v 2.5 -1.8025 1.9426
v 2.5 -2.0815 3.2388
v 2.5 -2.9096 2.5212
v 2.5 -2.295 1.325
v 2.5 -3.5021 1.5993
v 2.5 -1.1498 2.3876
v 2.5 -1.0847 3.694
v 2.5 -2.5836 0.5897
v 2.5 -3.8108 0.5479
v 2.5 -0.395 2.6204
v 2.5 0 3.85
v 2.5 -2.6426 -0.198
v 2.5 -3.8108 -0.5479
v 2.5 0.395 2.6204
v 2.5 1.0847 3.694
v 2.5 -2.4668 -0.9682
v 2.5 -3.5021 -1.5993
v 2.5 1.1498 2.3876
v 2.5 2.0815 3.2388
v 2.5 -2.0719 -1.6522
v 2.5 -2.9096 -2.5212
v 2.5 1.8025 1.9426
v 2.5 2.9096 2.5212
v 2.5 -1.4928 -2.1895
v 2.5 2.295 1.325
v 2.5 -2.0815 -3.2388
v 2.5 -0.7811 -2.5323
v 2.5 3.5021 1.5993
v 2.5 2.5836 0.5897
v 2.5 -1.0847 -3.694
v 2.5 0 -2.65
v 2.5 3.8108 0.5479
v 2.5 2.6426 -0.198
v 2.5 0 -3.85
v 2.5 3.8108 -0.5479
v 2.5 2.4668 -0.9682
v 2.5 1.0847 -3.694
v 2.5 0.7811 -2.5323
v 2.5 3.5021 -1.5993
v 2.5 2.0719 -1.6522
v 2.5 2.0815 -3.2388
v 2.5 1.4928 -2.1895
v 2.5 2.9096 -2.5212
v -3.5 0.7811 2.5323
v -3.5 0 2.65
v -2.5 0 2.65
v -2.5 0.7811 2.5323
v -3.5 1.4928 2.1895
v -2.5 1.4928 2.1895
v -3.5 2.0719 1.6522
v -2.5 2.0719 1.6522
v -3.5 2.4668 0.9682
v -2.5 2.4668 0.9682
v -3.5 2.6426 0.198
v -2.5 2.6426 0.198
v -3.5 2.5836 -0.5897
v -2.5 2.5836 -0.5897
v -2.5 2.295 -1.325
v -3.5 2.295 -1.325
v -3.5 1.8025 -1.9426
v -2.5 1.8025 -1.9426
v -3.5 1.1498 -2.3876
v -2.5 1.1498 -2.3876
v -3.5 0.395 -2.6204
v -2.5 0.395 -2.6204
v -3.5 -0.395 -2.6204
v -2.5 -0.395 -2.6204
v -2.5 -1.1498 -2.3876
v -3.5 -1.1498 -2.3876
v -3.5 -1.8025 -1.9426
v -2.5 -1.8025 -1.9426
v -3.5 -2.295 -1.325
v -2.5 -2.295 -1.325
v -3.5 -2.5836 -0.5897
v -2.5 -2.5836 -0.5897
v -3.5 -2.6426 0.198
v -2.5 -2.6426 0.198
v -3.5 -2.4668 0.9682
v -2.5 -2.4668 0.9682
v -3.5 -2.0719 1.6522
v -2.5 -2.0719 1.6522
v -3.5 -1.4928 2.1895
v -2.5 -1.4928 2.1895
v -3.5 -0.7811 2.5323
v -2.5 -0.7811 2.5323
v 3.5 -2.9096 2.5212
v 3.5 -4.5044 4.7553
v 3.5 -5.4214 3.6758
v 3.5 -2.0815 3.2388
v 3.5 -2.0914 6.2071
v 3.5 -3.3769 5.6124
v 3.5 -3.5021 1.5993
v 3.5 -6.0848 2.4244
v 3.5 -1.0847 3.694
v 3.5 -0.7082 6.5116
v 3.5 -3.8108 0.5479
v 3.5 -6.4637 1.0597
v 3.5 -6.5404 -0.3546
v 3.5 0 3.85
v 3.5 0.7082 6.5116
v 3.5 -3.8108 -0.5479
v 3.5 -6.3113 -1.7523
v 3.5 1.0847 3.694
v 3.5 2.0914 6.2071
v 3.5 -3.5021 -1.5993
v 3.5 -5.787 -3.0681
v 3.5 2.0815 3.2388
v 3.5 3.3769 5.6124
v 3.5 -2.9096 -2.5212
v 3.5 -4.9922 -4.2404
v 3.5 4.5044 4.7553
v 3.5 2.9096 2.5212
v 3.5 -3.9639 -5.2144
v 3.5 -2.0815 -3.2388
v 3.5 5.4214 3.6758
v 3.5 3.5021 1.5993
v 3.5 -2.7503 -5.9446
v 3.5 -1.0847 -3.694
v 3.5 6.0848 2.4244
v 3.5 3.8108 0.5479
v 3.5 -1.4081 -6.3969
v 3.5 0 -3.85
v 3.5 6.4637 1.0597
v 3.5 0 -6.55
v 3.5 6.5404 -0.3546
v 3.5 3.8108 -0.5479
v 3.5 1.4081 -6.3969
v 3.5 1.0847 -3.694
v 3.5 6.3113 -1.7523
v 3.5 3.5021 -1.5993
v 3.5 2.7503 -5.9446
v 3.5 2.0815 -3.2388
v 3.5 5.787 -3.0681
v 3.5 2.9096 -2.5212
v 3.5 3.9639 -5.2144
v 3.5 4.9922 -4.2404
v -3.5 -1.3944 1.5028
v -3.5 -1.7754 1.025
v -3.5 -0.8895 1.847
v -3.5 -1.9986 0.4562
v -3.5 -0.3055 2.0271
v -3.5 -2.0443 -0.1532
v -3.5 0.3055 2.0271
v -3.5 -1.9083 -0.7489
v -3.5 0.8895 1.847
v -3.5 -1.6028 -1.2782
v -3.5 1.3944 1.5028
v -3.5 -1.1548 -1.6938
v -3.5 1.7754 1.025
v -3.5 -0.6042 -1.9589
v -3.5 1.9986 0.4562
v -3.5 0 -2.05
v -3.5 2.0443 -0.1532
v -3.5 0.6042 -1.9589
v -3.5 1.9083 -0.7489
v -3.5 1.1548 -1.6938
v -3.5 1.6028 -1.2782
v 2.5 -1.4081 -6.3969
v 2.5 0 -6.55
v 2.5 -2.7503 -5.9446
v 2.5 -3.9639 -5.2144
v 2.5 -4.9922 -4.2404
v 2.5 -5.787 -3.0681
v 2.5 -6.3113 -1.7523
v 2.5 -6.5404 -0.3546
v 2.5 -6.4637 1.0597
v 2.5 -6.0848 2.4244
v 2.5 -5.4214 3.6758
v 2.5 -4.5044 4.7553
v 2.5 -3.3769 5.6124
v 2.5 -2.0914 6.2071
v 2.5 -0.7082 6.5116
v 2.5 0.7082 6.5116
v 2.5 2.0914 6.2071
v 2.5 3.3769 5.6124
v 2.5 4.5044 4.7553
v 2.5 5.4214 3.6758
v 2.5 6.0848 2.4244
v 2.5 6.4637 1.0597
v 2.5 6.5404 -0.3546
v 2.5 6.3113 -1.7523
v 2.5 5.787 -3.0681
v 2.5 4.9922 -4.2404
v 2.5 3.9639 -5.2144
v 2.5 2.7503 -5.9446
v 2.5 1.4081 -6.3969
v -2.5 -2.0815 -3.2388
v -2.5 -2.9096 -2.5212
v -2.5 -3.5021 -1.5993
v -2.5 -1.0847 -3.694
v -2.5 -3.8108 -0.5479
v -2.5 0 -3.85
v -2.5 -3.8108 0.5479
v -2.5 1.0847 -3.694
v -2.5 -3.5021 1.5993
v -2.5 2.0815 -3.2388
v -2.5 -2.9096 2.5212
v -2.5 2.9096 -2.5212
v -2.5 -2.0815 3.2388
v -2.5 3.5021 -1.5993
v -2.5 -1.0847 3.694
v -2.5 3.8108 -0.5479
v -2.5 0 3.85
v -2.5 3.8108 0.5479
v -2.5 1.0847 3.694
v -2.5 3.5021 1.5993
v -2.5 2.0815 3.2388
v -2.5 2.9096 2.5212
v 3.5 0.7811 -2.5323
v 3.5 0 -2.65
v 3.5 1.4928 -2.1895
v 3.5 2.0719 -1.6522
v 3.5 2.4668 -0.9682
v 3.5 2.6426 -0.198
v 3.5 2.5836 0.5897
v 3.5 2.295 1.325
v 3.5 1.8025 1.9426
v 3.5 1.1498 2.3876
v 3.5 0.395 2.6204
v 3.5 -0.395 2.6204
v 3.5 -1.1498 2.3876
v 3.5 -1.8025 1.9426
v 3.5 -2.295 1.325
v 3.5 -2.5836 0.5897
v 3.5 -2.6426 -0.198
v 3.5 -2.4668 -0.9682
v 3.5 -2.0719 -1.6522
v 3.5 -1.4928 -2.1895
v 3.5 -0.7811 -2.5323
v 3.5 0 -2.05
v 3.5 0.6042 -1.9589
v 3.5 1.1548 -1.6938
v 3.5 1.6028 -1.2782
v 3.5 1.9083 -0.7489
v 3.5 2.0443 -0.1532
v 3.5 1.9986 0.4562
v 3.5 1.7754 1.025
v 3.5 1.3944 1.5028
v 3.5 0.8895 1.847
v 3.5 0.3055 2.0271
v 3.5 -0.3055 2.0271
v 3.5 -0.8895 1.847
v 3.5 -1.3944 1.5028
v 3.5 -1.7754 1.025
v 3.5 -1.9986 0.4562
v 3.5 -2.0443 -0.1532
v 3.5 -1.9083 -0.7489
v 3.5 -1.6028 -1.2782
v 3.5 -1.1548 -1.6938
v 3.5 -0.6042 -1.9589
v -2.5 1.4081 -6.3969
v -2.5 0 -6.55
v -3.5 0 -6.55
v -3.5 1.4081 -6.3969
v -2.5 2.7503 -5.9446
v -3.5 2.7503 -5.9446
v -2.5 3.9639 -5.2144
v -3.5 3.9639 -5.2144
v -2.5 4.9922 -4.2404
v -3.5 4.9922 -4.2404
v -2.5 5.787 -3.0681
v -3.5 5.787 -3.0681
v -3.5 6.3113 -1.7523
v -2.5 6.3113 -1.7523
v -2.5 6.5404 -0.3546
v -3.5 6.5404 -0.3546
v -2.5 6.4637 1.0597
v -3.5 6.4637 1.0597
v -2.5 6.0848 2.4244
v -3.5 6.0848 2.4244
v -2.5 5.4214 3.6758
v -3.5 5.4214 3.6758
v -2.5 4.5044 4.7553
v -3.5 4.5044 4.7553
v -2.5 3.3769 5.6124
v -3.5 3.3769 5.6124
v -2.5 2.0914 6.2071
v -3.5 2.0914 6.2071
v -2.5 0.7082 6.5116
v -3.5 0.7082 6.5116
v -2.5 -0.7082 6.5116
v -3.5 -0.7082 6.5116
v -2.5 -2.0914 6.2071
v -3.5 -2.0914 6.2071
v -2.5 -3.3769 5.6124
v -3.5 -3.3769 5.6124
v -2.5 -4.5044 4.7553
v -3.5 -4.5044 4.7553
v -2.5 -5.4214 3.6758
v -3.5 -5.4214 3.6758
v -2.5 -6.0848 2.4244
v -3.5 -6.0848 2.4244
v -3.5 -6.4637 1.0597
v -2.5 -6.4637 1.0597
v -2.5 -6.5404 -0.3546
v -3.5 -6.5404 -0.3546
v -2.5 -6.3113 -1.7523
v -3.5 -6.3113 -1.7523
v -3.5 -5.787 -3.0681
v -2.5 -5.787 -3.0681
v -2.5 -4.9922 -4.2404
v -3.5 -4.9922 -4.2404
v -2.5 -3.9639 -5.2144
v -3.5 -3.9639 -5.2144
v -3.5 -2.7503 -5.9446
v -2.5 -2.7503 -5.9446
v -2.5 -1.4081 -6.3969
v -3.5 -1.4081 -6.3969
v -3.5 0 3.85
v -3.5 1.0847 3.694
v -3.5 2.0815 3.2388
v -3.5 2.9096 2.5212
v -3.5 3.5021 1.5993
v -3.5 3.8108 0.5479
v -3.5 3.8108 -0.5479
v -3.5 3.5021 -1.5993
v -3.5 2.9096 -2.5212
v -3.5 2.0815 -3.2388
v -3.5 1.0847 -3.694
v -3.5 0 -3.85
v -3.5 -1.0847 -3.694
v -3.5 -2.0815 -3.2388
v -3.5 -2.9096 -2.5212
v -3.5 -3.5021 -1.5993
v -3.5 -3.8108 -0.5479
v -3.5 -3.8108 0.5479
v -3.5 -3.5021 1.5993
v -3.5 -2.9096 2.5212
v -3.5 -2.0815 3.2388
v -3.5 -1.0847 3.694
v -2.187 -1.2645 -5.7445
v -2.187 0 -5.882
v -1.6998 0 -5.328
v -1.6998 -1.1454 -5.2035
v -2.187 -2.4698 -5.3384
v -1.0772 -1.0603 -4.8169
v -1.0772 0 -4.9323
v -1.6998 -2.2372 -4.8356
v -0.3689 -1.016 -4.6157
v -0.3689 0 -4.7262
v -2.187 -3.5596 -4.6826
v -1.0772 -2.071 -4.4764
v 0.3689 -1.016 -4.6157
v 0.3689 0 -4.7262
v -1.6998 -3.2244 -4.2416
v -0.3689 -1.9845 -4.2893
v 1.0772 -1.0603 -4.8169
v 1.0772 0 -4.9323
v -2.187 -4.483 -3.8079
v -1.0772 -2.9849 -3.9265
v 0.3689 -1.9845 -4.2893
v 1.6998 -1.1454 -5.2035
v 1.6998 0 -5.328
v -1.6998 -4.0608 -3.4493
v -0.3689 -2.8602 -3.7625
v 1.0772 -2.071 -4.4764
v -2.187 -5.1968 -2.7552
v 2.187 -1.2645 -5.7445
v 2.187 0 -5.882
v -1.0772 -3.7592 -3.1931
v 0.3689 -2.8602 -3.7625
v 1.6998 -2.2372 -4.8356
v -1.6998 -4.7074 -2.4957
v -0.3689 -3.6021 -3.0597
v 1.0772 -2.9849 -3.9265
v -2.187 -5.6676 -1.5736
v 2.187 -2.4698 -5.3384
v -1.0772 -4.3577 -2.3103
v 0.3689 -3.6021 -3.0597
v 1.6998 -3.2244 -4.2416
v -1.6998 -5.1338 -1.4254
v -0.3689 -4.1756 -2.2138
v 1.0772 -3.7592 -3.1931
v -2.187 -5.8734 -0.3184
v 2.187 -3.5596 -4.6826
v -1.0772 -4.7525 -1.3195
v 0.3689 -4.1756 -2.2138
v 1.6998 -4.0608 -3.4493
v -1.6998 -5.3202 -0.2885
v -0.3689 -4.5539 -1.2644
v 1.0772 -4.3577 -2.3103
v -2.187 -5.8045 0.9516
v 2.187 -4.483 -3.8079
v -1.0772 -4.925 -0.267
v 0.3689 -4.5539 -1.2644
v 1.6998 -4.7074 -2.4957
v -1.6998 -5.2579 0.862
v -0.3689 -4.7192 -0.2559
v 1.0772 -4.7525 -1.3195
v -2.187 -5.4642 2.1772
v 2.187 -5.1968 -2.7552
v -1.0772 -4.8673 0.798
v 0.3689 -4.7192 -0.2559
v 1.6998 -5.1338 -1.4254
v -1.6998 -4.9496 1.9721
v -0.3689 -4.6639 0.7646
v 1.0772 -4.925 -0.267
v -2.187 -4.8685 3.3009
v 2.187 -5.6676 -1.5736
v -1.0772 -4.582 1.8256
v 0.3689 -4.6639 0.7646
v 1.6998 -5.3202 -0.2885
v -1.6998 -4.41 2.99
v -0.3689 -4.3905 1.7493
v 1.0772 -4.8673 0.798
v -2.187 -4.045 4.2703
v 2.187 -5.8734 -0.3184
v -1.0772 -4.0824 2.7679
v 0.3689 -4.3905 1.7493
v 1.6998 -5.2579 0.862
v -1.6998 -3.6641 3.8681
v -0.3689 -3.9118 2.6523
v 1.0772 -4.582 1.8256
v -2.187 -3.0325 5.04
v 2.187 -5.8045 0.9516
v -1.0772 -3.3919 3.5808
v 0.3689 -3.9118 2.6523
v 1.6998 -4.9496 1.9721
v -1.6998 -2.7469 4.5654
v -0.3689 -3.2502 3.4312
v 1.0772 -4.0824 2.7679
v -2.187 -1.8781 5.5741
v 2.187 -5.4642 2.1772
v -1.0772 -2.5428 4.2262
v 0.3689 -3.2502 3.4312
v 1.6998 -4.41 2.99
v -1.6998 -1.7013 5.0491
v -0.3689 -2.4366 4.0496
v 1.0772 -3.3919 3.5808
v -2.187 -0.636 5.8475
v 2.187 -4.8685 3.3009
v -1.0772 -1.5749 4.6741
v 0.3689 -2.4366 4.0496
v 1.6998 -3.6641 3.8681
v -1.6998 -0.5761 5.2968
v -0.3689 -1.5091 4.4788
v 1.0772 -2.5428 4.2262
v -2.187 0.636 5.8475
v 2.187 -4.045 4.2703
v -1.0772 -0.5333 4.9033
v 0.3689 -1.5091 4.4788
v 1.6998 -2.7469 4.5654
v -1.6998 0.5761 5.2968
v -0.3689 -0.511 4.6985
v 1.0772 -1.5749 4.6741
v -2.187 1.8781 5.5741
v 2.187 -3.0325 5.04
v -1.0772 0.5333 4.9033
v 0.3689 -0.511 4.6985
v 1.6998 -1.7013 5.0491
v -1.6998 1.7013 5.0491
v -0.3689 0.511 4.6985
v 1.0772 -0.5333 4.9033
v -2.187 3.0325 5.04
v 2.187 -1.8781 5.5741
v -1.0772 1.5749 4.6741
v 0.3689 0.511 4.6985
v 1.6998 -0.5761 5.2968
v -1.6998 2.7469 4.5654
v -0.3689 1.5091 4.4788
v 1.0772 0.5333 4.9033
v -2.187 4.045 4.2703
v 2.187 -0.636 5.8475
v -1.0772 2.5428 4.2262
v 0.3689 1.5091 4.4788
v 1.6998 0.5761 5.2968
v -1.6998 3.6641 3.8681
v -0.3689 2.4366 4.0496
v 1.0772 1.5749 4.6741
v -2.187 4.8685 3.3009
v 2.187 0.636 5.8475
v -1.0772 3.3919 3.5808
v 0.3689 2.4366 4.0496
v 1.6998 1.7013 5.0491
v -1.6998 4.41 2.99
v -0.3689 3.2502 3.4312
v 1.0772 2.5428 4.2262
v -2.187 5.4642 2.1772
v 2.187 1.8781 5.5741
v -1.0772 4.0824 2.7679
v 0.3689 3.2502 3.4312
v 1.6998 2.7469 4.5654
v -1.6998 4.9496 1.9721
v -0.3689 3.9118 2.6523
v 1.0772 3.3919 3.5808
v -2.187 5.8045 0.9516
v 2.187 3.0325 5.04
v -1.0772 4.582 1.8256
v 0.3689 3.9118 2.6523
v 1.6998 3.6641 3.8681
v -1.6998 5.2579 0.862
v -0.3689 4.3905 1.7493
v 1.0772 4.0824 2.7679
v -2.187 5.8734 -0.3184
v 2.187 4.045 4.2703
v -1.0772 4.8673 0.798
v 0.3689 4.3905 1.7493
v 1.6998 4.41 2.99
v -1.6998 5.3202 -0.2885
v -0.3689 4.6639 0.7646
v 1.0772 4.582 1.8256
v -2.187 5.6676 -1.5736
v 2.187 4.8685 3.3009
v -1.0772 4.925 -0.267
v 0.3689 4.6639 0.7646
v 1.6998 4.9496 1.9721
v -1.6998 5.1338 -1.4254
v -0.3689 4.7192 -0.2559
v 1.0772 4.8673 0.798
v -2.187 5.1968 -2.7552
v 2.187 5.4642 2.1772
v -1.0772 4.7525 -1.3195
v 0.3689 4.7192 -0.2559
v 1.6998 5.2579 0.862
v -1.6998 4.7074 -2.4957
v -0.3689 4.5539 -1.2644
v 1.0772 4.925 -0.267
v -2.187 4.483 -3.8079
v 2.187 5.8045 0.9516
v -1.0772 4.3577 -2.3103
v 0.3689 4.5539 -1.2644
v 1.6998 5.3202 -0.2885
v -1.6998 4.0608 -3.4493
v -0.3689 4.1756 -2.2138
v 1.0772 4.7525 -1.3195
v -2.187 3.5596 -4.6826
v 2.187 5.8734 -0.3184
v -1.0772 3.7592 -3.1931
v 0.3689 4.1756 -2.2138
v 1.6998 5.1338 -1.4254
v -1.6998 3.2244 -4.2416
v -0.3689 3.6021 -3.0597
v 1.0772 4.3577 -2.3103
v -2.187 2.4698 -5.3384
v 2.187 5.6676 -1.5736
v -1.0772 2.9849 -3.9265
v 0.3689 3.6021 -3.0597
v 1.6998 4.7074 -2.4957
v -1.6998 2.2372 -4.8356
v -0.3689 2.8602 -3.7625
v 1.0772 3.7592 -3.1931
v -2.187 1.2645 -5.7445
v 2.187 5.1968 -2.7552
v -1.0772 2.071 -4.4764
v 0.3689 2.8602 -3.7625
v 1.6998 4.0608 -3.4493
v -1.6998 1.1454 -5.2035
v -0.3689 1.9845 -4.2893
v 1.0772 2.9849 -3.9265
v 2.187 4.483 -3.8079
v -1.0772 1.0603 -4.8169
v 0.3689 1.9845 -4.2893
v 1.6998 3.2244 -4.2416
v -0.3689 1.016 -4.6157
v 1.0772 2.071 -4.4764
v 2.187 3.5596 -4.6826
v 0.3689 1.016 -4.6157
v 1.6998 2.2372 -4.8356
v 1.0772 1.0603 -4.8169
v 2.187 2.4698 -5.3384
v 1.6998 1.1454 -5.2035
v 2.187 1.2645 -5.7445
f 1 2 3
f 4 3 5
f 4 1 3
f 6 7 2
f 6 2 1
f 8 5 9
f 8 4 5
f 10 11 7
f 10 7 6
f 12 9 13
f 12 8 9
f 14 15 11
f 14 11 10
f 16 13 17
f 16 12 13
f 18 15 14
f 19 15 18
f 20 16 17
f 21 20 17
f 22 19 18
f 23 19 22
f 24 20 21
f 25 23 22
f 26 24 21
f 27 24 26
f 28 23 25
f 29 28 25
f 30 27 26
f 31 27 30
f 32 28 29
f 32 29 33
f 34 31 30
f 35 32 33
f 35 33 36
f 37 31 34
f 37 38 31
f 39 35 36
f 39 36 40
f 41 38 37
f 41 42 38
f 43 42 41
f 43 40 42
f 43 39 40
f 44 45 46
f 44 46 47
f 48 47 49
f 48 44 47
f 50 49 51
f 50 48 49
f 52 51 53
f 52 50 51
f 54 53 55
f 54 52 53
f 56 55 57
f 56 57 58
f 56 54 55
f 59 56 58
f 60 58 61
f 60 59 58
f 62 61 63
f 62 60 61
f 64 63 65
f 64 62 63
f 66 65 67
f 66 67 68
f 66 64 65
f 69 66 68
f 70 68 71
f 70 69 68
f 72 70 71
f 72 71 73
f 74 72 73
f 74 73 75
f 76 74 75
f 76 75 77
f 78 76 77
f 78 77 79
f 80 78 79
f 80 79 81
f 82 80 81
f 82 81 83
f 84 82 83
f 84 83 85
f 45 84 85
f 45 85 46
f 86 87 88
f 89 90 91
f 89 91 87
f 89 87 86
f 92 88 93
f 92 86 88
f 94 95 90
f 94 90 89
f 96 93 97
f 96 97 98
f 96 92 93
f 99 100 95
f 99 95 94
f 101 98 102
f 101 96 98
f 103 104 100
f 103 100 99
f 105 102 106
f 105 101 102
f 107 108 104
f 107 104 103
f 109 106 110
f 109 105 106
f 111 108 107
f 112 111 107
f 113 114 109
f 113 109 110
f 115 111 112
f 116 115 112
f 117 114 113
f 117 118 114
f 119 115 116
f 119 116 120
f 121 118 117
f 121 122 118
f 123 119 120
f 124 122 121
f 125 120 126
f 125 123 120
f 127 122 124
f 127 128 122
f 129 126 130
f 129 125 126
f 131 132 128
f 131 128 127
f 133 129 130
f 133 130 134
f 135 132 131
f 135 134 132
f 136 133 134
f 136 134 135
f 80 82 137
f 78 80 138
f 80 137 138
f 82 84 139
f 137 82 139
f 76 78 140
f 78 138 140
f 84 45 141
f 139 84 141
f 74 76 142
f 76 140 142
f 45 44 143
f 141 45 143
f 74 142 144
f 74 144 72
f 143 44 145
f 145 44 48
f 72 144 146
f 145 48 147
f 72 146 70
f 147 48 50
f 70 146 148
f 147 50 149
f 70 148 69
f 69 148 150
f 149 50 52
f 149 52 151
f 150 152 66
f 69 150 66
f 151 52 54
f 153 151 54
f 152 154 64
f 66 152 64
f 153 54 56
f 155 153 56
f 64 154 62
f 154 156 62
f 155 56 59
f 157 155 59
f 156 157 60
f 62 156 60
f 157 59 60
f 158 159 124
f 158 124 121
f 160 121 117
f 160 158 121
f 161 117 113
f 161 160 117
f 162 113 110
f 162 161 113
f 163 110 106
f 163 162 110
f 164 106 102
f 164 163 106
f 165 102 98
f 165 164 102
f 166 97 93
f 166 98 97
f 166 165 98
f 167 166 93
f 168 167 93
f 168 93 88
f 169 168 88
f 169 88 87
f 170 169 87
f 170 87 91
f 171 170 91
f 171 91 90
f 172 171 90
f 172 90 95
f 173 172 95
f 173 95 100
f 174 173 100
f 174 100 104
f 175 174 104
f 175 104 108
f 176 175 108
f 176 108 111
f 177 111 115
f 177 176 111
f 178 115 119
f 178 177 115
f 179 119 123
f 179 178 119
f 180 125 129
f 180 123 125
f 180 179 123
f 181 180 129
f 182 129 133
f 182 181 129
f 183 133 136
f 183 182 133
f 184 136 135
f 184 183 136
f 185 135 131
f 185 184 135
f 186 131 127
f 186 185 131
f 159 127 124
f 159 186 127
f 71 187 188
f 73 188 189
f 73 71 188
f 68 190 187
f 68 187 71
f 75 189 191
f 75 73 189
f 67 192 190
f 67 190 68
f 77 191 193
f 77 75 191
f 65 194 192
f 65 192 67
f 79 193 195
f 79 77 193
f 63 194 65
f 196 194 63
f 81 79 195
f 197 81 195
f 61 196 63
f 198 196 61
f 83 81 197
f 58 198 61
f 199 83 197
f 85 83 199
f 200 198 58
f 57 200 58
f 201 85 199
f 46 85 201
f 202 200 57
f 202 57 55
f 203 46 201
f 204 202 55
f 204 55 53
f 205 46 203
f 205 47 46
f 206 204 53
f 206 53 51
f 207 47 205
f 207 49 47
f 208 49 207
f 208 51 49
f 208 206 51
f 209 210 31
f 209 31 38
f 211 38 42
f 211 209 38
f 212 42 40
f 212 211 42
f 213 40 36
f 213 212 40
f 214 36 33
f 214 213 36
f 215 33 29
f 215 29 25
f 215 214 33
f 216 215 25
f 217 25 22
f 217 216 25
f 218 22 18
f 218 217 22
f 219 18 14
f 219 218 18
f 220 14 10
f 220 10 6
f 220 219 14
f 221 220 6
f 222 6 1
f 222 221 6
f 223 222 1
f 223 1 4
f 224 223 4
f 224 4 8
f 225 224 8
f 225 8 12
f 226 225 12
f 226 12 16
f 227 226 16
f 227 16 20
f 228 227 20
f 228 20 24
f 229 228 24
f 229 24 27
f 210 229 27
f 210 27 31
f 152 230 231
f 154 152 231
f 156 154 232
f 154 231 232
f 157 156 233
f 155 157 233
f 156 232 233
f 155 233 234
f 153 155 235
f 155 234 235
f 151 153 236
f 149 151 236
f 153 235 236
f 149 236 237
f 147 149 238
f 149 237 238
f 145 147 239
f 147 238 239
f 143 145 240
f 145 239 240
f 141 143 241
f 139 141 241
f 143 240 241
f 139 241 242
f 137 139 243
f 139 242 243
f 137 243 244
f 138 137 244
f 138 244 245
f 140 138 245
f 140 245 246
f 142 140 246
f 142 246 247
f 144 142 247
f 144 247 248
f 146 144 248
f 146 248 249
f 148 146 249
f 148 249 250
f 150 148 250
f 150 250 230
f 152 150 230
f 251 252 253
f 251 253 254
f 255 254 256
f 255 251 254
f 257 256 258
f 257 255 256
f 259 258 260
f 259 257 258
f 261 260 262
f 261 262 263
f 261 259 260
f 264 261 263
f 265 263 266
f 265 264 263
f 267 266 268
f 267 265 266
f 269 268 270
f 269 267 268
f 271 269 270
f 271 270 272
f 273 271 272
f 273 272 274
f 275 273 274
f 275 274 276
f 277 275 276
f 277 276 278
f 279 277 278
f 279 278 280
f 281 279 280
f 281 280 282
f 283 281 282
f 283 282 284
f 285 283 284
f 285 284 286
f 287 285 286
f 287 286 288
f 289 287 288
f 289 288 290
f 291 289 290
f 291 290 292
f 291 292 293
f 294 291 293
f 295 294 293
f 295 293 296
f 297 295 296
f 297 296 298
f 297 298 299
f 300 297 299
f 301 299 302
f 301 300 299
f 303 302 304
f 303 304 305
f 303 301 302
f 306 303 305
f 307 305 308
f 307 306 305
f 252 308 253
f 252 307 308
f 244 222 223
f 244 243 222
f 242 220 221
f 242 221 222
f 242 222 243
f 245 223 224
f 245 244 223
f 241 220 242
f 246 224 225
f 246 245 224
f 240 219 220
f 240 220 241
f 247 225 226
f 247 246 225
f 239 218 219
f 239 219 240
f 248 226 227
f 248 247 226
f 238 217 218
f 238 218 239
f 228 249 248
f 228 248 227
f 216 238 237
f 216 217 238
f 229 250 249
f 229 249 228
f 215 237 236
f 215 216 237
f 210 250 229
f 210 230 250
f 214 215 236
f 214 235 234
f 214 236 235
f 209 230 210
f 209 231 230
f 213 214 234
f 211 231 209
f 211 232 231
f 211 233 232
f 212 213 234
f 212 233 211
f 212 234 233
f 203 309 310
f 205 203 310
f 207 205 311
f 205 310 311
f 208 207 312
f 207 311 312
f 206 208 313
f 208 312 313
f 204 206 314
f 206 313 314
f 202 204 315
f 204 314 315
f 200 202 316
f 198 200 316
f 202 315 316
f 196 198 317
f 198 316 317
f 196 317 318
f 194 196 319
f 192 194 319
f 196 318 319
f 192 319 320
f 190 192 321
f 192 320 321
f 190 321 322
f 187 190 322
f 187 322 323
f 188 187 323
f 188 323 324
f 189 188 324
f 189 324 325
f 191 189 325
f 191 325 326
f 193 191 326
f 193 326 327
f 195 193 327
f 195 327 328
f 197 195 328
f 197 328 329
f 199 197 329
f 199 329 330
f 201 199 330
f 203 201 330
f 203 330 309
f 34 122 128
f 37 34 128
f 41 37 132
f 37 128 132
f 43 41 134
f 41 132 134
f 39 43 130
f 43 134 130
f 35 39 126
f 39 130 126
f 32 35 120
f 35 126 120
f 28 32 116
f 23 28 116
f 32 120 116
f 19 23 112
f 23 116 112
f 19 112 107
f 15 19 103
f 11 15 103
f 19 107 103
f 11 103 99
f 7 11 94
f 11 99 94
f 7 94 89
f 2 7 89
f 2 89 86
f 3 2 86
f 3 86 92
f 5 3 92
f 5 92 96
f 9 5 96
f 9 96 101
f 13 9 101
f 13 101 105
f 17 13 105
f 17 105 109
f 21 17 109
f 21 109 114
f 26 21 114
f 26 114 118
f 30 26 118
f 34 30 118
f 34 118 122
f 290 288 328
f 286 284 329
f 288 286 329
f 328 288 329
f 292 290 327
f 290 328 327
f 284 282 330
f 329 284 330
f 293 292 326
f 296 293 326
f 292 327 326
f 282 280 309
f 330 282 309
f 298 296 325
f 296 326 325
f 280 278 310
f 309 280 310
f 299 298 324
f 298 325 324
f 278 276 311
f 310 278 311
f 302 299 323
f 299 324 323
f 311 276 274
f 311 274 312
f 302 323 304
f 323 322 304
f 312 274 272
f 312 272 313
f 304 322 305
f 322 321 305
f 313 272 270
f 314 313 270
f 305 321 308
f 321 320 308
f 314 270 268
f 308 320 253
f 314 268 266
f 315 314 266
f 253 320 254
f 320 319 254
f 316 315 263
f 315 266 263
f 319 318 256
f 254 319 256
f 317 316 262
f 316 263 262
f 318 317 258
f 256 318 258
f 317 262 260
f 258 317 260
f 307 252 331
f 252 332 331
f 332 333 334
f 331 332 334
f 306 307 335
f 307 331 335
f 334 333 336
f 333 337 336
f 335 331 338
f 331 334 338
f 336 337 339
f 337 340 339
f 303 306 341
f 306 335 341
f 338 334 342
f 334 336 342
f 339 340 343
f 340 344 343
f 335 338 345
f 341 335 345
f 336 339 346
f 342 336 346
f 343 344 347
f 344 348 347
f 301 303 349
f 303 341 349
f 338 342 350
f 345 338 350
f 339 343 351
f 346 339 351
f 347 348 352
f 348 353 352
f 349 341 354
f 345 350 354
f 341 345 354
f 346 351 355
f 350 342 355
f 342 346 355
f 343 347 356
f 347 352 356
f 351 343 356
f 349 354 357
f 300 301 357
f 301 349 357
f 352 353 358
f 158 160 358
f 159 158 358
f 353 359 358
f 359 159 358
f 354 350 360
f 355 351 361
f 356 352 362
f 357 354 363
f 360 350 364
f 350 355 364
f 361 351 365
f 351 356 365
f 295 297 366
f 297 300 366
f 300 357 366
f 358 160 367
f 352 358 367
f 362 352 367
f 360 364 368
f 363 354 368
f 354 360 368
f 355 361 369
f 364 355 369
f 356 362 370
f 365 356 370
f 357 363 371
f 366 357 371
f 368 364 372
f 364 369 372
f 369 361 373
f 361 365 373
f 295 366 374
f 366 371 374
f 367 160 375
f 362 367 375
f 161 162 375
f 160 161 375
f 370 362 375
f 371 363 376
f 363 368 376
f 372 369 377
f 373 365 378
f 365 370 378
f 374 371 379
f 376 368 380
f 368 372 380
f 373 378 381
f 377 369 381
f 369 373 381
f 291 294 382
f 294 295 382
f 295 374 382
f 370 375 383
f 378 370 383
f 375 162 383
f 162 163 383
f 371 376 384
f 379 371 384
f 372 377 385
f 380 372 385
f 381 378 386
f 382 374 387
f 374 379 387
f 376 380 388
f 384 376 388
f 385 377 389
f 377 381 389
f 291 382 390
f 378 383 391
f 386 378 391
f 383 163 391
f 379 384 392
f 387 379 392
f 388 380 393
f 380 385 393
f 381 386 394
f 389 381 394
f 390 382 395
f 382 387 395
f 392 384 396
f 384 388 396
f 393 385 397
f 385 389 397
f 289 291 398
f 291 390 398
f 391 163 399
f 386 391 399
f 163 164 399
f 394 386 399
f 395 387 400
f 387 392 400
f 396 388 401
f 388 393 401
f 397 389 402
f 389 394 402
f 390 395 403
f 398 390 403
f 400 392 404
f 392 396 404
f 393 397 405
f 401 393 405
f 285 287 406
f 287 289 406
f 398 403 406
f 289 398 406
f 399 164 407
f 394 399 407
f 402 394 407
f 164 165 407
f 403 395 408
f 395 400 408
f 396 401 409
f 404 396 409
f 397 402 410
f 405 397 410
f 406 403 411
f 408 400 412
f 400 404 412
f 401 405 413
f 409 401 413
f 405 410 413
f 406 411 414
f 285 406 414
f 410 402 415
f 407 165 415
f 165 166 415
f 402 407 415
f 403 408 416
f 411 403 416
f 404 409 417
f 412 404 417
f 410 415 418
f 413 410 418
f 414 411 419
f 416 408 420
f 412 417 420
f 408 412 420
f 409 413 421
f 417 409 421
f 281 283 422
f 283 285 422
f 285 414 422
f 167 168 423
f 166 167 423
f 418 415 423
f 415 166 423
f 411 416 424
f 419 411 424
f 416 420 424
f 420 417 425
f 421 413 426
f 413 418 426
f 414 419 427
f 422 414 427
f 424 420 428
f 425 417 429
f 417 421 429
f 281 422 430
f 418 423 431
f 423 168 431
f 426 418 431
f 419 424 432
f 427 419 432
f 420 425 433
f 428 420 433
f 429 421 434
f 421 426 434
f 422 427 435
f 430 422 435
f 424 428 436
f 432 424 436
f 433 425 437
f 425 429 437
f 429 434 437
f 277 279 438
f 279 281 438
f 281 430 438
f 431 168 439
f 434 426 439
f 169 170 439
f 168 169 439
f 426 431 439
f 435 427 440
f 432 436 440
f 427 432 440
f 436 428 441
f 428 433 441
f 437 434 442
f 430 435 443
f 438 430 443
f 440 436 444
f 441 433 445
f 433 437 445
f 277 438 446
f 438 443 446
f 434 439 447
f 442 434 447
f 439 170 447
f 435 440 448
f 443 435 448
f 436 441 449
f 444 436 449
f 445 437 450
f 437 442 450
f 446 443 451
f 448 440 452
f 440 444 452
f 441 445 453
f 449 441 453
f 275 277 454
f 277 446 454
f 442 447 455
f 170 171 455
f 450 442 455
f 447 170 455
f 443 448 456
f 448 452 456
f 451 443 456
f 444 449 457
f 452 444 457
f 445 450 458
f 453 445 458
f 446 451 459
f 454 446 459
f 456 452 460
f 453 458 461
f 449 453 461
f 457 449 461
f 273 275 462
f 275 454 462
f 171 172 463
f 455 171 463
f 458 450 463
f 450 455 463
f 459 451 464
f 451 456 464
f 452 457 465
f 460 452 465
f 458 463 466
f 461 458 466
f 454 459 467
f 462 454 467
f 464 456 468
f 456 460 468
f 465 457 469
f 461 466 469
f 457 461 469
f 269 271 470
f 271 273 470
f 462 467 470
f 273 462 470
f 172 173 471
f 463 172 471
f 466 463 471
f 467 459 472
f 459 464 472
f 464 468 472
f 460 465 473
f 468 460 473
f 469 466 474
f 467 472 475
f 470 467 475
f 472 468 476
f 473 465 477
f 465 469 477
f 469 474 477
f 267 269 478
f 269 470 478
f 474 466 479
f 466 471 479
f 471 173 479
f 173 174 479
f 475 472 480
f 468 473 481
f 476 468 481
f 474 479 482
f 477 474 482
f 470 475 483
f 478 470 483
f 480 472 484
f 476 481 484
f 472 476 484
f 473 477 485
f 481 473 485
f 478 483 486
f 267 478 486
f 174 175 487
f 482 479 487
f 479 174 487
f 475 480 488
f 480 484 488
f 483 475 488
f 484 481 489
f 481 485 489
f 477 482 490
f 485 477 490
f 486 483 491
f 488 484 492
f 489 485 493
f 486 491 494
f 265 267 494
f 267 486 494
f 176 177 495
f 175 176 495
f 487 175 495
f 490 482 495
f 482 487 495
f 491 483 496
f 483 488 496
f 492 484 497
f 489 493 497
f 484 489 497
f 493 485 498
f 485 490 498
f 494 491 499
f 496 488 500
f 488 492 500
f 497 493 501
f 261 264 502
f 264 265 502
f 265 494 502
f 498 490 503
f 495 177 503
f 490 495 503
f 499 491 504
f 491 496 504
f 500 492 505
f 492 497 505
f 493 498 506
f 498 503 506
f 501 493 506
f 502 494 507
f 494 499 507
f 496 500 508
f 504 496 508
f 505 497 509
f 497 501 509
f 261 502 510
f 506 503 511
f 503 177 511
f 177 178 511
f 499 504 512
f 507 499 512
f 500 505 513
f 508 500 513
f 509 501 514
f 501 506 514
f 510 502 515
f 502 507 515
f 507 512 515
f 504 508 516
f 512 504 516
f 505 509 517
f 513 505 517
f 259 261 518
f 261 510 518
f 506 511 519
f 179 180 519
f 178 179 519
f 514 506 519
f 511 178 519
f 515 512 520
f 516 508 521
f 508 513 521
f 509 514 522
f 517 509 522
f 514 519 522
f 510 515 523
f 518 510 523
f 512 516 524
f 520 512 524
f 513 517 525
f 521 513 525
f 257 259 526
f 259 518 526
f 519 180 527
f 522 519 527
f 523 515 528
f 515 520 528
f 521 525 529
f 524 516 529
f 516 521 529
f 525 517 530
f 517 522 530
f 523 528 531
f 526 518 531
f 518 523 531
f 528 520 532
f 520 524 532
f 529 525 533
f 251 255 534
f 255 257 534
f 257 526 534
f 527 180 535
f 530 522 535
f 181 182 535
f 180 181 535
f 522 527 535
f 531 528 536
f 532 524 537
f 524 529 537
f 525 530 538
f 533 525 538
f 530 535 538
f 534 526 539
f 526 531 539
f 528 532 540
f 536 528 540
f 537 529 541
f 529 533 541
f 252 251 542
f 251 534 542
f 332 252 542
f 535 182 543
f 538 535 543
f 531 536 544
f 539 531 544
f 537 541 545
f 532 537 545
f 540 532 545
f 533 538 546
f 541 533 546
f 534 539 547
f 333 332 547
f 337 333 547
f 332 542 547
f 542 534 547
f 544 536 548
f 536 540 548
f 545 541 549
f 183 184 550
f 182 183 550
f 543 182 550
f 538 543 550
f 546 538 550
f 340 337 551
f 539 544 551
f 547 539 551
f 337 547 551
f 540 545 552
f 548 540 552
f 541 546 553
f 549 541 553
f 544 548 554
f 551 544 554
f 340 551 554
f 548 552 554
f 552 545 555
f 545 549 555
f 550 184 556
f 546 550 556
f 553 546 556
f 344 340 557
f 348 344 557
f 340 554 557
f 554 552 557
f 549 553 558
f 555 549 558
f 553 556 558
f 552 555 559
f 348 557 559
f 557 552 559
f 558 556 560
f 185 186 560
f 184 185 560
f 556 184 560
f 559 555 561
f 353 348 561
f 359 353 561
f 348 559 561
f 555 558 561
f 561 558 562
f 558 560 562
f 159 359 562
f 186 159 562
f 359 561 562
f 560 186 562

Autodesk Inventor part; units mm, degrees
ref_plane "YZ Plane" through (0, 0, 0) normal (1, 0, 0) x (0, 1, 0)
ref_plane "XZ Plane" through (0, 0, 0) normal (0, 1, 0) x (-1, 0, 0)
ref_plane "XY Plane" through (0, 0, 0) normal (0, 0, 1) x (1, 0, 0)
sketch "Sketch1" plane through (0, 0, 0) normal (0, 1, 0) x (-1, 0, 0)
  line L0 (0, 0) -> (0, -4.7) construction
  line L1 (3.5, 0) -> (-3.5, 0) construction
  line L2 (3.5, 0) -> (3.5, -6.55) construction
  line L3 (3.5, -6.55) -> (2.5, -6.55)
  line L4 (-3.5, -6.55) -> (-2.5, -6.55)
  arc A0 (2.5, -6.55) -> (-2.5, -6.55) centre (0, -7.3142) ccw
  line L5 (3.5, -2.05) -> (-3.5, -2.05)
  line L6 (3.5, -2.05) -> (3.5, -6.55)
  line L7 (-3.5, -2.05) -> (-3.5, -6.55)
  dimension "d0" = 4.7
  dimension "d1" = 7
  dimension "d2" = 3.5
  dimension "d3" = 6.55
  dimension "d4" = 1
  dimension "d5" = 1
  dimension "d6" = 2.05
revolve "Revolution1" add sketch "Sketch1" angle 360 about axis through (-3.5, 0, 0) along (1, 0, 0)
sketch "Sketch2" plane through (-3.5, 0, 0) normal (-1, 0, 0) x (0, 0, 1)
  circle A0 centre (0, 0) radius 6.55 projected
  circle A1 centre (0, 0) radius 2.05 projected
  circle A2 centre (0, 0) radius 2.65
  circle A3 centre (0, 0) radius 3.85
  point P0 (0, 0)
  dimension "d8" = 5.3
  dimension "d9" = 7.7
extrude "Extrusion1" cut sketch "Sketch2" against normal blind 1 contours A3
sketch "Sketch3" plane through (3.5, 0, 0) normal (1, 0, 0) x (0, 0, -1)
  circle A0 centre (0, 0) radius 3.85
  circle A1 centre (0, 0) radius 2.65
  dimension "d12" = 7.7
  dimension "d13" = 5.3
extrude "Extrusion2" cut sketch "Sketch3" against normal blind 1
equation "\"d2\" = 0.5 * d1"
properties part number "WheelYBottom"
